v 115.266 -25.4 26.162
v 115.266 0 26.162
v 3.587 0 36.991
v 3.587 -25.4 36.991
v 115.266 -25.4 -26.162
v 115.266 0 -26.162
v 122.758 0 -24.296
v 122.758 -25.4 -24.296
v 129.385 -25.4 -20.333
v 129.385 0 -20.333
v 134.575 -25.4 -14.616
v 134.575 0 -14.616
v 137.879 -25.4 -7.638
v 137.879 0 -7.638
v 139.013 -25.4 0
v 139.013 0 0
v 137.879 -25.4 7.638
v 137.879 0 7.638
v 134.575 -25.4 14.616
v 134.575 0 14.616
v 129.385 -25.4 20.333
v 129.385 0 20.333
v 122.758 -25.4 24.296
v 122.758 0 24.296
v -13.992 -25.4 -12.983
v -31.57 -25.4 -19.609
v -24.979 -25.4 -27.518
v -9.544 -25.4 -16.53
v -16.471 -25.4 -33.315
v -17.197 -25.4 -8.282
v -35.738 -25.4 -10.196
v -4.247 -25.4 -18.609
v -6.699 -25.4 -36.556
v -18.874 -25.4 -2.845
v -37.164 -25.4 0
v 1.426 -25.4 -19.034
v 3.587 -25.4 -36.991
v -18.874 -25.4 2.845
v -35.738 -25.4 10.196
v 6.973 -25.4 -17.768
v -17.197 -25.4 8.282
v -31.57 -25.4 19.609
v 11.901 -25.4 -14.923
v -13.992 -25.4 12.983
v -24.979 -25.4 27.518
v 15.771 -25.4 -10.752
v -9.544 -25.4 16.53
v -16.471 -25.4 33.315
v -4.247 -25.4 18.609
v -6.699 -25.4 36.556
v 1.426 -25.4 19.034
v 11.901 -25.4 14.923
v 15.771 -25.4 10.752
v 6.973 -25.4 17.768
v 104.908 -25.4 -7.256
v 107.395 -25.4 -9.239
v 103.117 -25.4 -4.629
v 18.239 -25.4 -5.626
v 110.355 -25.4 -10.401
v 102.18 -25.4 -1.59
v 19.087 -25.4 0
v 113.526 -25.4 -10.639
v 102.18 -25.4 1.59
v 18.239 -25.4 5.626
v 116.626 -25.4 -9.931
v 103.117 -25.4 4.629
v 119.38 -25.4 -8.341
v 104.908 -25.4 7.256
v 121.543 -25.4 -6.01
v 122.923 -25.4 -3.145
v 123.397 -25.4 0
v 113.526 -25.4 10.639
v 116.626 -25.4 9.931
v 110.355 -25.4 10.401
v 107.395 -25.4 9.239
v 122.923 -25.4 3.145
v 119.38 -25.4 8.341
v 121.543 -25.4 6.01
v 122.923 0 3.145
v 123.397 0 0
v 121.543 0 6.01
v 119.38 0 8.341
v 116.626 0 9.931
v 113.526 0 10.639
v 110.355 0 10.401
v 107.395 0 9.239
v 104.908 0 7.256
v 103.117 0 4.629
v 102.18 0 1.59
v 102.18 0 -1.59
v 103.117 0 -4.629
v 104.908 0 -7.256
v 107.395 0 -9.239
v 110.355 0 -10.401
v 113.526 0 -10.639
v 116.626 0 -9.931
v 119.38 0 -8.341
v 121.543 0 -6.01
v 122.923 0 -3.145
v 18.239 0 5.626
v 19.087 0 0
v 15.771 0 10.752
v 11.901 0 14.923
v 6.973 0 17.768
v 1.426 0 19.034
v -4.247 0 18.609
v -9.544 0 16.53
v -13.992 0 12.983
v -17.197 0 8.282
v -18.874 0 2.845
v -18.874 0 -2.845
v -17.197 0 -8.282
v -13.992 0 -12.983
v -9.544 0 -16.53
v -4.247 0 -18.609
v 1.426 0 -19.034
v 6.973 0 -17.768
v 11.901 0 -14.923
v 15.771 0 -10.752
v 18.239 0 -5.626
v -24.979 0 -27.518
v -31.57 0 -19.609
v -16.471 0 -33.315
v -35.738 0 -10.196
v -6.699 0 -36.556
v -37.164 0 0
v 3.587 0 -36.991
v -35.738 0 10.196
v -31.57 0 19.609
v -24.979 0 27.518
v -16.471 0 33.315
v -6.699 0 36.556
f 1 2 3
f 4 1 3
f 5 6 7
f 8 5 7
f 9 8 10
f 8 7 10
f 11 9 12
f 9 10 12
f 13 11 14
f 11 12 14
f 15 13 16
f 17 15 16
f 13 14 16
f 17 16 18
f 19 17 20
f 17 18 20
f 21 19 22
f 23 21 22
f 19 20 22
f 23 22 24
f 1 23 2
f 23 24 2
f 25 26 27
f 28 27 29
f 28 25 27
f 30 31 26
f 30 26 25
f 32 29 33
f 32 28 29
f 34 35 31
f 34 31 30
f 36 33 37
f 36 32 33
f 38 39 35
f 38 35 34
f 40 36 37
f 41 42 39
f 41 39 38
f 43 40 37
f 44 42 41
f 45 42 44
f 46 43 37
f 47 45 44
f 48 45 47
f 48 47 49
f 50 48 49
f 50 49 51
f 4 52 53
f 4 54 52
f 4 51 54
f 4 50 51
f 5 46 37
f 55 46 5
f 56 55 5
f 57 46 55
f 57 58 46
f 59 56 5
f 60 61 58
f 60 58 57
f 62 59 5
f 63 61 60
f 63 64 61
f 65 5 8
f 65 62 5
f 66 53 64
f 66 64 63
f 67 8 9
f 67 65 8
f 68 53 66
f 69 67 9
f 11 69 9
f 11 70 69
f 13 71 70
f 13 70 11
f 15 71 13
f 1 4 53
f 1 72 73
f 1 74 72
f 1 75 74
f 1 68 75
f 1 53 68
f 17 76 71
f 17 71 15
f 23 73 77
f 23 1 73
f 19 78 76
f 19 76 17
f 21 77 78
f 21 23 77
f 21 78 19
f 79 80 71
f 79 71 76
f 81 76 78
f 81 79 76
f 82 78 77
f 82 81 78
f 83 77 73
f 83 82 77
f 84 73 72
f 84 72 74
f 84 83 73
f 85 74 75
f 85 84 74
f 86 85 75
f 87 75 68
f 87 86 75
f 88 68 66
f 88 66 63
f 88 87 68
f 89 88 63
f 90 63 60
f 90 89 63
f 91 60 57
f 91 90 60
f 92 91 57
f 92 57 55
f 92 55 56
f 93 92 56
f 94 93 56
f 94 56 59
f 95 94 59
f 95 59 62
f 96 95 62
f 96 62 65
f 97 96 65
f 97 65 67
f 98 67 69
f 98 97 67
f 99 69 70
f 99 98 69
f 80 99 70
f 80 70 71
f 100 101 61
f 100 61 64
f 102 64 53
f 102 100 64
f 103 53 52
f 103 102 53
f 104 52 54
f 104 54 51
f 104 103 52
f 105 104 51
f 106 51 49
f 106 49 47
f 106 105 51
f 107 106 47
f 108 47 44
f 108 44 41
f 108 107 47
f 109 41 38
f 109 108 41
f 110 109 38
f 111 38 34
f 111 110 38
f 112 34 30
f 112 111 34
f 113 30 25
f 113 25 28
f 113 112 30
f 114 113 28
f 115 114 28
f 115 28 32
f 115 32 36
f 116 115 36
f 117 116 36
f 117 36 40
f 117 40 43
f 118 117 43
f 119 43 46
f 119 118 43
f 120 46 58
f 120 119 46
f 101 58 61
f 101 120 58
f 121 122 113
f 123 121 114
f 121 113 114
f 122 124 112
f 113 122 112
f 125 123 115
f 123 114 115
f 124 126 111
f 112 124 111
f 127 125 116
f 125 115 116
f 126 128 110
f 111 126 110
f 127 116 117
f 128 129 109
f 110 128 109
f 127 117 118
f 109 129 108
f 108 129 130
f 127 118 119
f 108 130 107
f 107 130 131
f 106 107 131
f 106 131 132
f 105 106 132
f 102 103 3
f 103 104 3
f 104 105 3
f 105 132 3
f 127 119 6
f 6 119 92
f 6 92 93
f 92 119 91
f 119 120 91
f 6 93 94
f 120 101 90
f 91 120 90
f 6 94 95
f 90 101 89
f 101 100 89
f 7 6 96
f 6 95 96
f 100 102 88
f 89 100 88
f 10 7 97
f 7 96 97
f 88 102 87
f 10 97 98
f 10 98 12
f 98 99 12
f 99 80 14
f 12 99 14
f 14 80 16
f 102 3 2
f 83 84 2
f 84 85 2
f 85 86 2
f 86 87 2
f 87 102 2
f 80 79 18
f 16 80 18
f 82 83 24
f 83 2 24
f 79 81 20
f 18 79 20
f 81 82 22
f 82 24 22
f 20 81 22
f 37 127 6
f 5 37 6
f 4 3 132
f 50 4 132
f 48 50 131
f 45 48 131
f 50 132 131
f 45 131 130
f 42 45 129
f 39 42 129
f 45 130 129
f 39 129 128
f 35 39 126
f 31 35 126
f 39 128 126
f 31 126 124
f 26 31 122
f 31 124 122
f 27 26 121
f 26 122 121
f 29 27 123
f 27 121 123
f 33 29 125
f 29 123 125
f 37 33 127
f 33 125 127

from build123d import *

# Parameters (mm, degrees)
F0_R     = 19.08734
F0_R_2   = 10.668378
F1_DEPTH = 25.4


with BuildPart() as f1:
    # F0 (on Front) → F1 (new body)
    with BuildSketch(Plane.XZ):
        with BuildLine():
            Line((115.265532, 26.16193), (3.586851, 36.99093))
            ThreePointArc((3.586851, 36.99093), (-37.164423, 0), (3.586851, -36.99093))
            Line((3.586851, -36.99093), (115.265532, -26.16193))
            ThreePointArc((115.265532, -26.16193), (139.013356, 0), (115.265532, 26.16193))
        make_face()
        Circle(F0_R, mode=Mode.SUBTRACT)
        with Locations((112.728722, 0)):
            Circle(F0_R_2, mode=Mode.SUBTRACT)
    extrude(amount=F1_DEPTH)


solid = f1.part
